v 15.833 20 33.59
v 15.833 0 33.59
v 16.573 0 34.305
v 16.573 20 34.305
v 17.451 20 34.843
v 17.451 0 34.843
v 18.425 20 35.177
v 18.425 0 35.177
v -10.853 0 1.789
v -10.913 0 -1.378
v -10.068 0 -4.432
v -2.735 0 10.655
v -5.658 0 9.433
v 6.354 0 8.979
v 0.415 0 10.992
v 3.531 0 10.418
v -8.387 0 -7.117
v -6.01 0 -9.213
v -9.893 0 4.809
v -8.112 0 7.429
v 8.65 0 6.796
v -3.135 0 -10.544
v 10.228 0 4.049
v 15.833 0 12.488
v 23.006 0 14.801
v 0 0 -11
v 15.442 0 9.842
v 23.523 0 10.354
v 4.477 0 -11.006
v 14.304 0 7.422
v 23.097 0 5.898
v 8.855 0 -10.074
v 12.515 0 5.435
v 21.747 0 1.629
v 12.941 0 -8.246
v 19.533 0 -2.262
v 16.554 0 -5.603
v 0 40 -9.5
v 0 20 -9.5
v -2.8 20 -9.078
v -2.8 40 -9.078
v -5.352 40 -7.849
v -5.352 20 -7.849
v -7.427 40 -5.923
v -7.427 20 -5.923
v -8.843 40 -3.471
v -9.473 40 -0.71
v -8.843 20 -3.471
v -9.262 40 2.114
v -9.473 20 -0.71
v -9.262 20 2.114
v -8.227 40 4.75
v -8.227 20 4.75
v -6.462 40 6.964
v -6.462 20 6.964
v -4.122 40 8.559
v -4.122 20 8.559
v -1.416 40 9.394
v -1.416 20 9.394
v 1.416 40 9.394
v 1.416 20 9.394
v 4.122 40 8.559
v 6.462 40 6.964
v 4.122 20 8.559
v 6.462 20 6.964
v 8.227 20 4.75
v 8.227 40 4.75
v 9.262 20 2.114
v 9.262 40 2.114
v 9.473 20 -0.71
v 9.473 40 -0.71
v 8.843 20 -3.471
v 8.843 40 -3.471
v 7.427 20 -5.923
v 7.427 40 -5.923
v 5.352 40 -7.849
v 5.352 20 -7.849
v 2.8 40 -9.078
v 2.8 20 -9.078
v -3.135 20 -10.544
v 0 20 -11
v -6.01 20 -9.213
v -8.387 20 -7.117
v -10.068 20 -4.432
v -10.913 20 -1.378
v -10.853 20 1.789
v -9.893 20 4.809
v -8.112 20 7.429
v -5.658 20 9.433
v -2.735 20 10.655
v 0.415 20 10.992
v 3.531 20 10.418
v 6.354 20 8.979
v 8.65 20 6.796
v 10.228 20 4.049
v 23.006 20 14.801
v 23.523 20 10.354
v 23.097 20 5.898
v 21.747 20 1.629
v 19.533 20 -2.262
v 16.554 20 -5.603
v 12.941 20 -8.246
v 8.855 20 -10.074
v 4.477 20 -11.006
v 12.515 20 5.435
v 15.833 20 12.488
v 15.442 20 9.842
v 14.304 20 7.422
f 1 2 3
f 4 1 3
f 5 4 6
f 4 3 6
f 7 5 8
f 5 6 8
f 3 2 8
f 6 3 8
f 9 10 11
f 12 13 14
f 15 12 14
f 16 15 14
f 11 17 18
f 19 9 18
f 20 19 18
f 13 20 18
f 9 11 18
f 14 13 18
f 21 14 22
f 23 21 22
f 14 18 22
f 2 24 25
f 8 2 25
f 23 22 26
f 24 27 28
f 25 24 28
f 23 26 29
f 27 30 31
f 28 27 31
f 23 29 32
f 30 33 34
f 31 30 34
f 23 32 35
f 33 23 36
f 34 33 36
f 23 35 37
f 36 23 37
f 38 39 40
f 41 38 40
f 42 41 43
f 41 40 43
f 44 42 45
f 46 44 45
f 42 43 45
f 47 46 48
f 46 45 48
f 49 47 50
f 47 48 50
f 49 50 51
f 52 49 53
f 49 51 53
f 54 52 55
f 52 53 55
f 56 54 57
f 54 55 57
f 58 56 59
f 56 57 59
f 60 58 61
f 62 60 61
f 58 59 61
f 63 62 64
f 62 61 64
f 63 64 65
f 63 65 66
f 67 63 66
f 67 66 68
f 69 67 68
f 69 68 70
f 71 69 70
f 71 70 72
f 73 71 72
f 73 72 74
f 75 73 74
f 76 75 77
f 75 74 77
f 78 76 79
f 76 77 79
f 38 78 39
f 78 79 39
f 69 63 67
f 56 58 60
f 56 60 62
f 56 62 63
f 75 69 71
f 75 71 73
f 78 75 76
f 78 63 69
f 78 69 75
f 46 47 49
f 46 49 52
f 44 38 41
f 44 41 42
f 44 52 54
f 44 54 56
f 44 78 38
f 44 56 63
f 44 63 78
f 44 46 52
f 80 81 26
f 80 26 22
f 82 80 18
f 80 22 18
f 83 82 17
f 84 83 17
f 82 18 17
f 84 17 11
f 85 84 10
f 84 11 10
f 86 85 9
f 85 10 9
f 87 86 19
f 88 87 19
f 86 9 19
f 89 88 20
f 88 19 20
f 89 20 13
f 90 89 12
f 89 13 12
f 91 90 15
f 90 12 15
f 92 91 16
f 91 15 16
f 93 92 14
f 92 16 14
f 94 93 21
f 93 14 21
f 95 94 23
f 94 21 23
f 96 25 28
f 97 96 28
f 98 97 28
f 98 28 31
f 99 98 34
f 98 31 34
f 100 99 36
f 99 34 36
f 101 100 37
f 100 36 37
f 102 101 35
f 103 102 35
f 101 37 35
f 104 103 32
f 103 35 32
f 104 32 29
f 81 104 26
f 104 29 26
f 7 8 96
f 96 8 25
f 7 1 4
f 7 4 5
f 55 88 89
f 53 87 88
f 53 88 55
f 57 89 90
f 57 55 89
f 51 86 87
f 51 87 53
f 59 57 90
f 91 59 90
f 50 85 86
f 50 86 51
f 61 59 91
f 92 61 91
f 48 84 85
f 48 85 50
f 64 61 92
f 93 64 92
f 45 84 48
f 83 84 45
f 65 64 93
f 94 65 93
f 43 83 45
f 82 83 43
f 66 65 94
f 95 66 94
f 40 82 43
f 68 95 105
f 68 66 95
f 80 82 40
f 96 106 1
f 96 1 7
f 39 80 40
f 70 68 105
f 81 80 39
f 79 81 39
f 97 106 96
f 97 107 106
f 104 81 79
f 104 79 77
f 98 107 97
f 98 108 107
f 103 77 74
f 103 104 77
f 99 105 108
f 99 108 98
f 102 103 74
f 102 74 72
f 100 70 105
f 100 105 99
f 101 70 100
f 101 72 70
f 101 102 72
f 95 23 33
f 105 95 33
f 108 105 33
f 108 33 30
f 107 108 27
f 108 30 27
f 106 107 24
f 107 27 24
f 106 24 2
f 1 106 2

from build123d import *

# Parameters (mm, degrees)
BOSS_EXTRUDE1_DEPTH = 20
SKETCH4_R           = 9.5
BOSS_EXTRUDE2_DEPTH = 20


with BuildPart() as part:
    # Sketch1 → Boss-Extrude1 (new body)
    with BuildSketch(Plane(origin=(0, 0, 0), x_dir=(1, 0, 0), z_dir=(0, 1, 0))):
        with BuildLine():
            Line((18.424541272, -35.177357689), (23.005994318, -14.800530945))
            ThreePointArc((23.005994318, -14.800530945), (18.132040633, 4.01076546), (0, 11))
            ThreePointArc((0, 11), (-9.097635455, -6.183286273), (10.227869895, -4.048540158))
            ThreePointArc((10.227869895, -4.048540158), (14.304101202, -7.422369294), (15.833057178, -12.488006305))
            Line((15.833057178, -12.488006305), (15.833057178, -33.589930418))
            ThreePointArc((15.833057178, -33.589930418), (16.997270485, -34.598365473), (18.424541272, -35.177357689))
        make_face()
    extrude(amount=BOSS_EXTRUDE1_DEPTH)

    # Sketch4 → Boss-Extrude2 (add)
    with BuildSketch(Plane(origin=(0, 20, 0), x_dir=(1, 0, 0), z_dir=(0, 1, 0))):
        with Locations(Location((0, 0, 0), (0, 0, 90))):
            Circle(SKETCH4_R)
    extrude(amount=BOSS_EXTRUDE2_DEPTH)


solid = part.part
